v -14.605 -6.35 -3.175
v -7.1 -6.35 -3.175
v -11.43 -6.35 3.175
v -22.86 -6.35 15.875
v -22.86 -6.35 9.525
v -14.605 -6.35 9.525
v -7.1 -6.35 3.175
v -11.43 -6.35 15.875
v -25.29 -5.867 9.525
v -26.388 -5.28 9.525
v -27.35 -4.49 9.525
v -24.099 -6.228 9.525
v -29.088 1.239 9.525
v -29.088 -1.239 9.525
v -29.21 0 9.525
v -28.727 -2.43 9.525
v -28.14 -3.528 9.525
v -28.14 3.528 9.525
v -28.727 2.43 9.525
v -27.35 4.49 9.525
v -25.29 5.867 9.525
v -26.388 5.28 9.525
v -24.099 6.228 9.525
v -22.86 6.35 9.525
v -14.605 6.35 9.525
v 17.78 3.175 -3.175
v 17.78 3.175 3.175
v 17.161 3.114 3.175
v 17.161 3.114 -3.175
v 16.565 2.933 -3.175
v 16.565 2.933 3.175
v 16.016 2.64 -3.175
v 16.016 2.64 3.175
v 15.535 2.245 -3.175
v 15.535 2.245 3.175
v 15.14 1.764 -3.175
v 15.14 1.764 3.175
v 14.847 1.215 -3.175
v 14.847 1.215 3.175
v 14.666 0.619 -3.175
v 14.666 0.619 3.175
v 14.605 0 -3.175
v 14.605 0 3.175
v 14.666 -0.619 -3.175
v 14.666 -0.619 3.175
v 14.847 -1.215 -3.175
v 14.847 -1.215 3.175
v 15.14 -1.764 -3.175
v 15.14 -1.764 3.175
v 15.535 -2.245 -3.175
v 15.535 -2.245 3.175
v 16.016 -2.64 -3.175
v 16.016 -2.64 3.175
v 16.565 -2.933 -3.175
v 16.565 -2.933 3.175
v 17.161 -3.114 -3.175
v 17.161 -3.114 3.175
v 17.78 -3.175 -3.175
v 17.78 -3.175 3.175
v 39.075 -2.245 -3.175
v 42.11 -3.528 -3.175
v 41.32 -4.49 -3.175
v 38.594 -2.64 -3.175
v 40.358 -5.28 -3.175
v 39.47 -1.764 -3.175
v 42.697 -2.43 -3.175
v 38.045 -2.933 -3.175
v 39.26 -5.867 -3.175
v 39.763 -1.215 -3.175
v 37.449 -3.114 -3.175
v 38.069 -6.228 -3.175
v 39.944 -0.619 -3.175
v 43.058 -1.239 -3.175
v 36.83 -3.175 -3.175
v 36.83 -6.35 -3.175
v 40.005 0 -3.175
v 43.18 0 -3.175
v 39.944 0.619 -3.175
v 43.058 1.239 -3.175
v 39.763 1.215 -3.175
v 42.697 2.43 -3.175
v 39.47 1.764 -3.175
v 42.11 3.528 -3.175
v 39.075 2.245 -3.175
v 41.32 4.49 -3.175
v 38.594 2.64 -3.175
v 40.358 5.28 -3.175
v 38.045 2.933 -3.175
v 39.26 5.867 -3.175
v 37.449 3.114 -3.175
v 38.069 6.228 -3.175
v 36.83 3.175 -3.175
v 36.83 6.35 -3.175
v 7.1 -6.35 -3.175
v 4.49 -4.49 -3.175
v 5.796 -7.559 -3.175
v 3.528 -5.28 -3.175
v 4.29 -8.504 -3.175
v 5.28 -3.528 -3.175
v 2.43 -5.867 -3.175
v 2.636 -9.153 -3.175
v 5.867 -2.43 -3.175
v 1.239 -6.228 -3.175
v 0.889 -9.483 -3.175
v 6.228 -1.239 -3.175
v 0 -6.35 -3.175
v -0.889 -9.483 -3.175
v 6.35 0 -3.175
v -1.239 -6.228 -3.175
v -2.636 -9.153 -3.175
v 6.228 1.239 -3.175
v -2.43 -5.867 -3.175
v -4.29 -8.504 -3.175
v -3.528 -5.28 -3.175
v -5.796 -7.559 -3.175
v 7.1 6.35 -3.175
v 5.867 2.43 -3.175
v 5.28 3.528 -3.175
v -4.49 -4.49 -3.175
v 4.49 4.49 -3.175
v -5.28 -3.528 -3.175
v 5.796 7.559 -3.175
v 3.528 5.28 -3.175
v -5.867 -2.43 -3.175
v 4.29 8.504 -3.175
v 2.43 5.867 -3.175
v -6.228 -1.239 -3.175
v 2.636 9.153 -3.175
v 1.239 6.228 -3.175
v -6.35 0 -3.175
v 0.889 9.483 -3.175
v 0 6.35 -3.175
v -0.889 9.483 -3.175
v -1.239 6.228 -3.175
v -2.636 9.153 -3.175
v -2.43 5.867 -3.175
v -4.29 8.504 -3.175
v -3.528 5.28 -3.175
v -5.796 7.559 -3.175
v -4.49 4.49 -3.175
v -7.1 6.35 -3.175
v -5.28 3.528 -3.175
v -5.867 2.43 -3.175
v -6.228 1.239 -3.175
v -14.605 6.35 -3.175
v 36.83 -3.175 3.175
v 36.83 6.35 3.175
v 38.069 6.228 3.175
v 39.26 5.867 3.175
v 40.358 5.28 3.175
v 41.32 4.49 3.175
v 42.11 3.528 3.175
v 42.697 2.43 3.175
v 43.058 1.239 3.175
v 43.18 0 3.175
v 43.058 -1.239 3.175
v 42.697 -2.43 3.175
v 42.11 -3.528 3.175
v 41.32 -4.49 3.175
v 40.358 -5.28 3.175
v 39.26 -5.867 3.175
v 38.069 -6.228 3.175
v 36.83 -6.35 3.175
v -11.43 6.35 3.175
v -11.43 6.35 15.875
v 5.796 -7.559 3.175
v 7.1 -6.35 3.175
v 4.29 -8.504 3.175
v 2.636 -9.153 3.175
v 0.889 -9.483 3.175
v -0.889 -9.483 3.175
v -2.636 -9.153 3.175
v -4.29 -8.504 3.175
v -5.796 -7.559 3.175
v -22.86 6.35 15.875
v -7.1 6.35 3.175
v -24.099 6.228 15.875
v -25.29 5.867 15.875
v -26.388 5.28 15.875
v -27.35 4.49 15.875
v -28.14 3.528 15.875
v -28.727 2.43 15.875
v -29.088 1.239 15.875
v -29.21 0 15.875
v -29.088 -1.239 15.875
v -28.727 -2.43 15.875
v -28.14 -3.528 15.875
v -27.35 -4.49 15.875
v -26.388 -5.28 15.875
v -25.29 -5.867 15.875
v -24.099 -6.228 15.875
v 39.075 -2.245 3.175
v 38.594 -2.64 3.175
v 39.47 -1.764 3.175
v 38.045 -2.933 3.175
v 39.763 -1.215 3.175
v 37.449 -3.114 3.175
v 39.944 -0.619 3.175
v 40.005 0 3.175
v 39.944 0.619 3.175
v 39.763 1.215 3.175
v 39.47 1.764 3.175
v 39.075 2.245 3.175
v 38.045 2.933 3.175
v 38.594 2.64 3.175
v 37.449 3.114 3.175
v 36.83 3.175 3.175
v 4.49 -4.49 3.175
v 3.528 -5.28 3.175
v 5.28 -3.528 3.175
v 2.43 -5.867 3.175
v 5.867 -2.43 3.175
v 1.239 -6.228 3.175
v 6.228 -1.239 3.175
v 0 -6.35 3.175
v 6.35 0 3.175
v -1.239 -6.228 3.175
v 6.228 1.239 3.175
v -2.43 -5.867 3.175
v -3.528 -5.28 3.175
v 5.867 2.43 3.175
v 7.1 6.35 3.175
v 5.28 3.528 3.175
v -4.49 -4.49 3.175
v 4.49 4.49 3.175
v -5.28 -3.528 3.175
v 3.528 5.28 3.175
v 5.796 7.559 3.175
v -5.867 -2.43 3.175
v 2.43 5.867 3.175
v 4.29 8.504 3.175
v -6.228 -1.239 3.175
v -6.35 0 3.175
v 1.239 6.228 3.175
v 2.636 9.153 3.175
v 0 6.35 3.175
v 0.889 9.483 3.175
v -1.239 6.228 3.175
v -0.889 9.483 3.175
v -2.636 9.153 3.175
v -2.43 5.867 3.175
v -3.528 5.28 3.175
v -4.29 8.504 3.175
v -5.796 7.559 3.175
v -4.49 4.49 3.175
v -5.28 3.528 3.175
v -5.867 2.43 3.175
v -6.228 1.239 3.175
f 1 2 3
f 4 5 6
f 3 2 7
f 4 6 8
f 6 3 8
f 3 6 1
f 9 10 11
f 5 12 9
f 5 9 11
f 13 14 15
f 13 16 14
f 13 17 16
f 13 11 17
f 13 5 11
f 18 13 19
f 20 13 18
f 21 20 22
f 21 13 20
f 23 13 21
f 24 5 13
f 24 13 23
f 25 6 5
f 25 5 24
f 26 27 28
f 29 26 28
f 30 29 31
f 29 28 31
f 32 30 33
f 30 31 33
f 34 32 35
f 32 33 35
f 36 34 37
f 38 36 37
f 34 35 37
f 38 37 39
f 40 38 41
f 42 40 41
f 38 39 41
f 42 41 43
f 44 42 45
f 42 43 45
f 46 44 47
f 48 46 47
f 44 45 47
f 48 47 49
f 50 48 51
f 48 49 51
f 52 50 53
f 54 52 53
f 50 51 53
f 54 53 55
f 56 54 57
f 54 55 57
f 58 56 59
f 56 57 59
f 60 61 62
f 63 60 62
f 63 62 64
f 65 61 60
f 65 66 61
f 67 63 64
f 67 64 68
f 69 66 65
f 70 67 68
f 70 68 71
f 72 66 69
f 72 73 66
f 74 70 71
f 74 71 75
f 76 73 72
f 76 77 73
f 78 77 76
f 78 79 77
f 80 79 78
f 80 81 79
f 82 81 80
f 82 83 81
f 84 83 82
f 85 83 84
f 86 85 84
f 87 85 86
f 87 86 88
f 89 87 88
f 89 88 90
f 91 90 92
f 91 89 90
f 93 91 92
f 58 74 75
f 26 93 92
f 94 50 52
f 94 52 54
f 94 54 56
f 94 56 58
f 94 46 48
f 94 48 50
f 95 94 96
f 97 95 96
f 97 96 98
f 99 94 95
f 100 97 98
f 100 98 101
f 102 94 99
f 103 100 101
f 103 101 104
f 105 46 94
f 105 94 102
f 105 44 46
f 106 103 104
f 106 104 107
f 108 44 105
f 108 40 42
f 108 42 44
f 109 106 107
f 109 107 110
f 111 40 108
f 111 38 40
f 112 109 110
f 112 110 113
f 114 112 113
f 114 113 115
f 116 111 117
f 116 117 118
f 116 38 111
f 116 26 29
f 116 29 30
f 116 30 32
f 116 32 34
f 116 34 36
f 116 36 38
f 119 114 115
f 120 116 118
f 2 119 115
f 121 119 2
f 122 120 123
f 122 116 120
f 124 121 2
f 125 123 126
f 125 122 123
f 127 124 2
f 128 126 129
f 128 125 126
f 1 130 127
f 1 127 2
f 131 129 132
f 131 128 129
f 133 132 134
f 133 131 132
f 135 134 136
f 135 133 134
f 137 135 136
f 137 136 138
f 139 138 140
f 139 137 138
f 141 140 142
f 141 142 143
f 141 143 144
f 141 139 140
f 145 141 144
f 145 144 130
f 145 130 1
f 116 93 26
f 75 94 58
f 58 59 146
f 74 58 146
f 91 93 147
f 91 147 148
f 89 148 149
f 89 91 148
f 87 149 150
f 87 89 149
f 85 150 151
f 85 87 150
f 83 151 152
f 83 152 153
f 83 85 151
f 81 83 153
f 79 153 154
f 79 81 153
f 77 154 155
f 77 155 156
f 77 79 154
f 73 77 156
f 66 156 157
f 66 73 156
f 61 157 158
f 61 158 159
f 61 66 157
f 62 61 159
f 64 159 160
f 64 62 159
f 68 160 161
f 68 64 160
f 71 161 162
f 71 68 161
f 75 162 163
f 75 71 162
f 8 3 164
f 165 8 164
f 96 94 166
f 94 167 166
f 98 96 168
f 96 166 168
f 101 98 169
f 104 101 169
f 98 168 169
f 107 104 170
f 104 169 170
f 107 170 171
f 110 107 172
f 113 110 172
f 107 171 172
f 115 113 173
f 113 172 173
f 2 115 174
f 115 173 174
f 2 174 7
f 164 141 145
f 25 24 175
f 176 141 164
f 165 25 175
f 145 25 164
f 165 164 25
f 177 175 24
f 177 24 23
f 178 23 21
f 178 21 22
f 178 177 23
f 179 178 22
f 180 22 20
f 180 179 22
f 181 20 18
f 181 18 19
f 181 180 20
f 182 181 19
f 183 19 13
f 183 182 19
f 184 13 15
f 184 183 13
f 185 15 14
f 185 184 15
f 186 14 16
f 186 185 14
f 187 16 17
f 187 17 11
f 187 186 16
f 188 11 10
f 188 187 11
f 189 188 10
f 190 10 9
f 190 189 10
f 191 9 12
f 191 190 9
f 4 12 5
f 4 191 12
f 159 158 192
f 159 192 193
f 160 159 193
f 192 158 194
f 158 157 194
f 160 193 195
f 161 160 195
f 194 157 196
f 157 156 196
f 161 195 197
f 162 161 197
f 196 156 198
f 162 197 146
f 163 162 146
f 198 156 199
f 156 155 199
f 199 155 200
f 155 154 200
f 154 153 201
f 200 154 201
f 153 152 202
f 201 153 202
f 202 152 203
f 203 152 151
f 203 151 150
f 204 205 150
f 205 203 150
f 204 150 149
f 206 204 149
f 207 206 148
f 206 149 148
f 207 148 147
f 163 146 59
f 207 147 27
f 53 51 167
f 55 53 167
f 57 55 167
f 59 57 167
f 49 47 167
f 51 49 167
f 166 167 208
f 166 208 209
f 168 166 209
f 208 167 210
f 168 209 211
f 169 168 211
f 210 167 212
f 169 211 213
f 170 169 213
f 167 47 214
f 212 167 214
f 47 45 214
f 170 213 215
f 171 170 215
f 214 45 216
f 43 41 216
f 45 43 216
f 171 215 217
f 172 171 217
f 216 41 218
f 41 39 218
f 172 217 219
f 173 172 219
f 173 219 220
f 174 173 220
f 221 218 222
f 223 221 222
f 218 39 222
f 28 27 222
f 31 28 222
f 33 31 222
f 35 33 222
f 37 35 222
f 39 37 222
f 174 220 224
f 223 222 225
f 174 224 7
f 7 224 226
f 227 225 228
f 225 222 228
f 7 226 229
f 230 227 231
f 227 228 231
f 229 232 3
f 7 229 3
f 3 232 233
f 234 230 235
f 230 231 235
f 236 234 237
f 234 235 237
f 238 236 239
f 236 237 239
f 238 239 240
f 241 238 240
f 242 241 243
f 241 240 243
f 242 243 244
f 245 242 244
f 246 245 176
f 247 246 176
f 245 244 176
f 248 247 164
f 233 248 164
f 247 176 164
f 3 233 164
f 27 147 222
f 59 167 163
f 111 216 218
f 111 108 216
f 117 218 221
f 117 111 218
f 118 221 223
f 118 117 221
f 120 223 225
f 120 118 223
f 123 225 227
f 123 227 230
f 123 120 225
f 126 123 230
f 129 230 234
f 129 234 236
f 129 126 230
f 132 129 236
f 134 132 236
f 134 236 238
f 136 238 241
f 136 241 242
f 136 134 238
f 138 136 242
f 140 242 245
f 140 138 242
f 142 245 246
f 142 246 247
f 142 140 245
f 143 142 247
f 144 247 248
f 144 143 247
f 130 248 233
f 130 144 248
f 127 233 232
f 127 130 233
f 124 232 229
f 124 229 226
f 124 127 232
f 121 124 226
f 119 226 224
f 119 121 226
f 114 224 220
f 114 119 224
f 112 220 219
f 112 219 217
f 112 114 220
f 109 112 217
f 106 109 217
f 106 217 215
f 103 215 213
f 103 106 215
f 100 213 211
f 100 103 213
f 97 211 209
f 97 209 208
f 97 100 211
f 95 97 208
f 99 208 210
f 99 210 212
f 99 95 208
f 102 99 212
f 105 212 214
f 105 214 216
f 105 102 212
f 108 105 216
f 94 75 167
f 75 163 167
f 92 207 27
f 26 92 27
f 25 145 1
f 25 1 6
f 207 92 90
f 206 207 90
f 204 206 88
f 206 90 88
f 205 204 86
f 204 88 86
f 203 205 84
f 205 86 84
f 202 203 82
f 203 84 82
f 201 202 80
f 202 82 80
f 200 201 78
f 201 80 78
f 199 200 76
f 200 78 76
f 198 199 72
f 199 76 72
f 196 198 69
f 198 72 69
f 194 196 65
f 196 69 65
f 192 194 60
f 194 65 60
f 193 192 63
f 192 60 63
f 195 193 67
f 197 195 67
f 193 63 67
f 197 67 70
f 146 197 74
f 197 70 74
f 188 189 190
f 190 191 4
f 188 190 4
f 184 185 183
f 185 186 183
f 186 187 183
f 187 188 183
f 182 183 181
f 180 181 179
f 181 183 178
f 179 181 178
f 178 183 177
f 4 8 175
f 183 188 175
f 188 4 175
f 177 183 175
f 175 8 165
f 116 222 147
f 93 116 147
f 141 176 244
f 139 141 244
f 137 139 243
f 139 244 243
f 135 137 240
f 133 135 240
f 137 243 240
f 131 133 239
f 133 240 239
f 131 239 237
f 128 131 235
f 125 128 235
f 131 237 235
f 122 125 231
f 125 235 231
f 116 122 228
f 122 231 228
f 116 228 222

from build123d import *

# Parameters (mm, degrees)
SKETCH1_R           = 6.35
BOSS_EXTRUDE1_DEPTH = 3.175
SKETCH2_R           = 6.35
SKETCH2_R_2         = 3.175
BOSS_EXTRUDE2_DEPTH = 6.35
CUT_EXTRUDE2_DEPTH  = 6.35
SKETCH5_W           = 6.35
SKETCH5_H           = 12.7
BOSS_EXTRUDE3_DEPTH = 12.7
SKETCH6_W           = 6.35
SKETCH6_H           = 12.7
BOSS_EXTRUDE4_DEPTH = 5.08
SKETCH7_R           = 6.35
BOSS_EXTRUDE5_DEPTH = 6.35
SKETCH9_W           = 12.7
SKETCH9_H           = 12.7
CUT_EXTRUDE4_DEPTH  = 3.175


with BuildPart() as part:
    # Sketch1 → Boss-Extrude1 (new body, symmetric)
    with BuildSketch(Plane.XY):
        with BuildLine():
            Line((7.099515829, 6.35), (31.75, 6.35))
            Line((31.75, 6.35), (36.83, 6.35))
            Line((36.83, 6.35), (36.83, -6.35))
            Line((36.83, -6.35), (31.75, -6.35))
            Line((31.75, -6.35), (7.099515829, -6.35))
            ThreePointArc((7.099515829, -6.35), (0, -9.525), (-7.099515829, -6.35))
            Line((-7.099515829, -6.35), (-17.78, -6.35))
            Line((-17.78, -6.35), (-17.78, 6.35))
            Line((-17.78, 6.35), (-7.099515829, 6.35))
            ThreePointArc((-7.099515829, 6.35), (0, 9.525), (7.099515829, 6.35))
        make_face()
        Circle(SKETCH1_R, mode=Mode.SUBTRACT)
    extrude(amount=BOSS_EXTRUDE1_DEPTH, both=True)

    # Sketch2 → Boss-Extrude2 (add)
    with BuildSketch(Plane(origin=(0, 0, -3.175), x_dir=(-1, 0, 0), z_dir=(0, 0, -1))):
        with Locations((-36.83, 0)):
            Circle(SKETCH2_R)
        with Locations((-36.83, 0)):
            Circle(SKETCH2_R_2, mode=Mode.SUBTRACT)
    extrude(amount=-BOSS_EXTRUDE2_DEPTH)

    # Sketch4 → Cut-Extrude2 (cut)
    with BuildSketch(Plane.XY.offset(3.175)):
        with BuildLine():
            Line((36.83, 3.175), (17.78, 3.175))
            ThreePointArc((17.78, 3.175), (14.605, 0), (17.78, -3.175))
            Line((17.78, -3.175), (36.83, -3.175))
            ThreePointArc((36.83, -3.175), (40.005, 0), (36.83, 3.175))
        make_face()
    extrude(amount=-CUT_EXTRUDE2_DEPTH, mode=Mode.SUBTRACT)

    # Sketch5 → Boss-Extrude3 (add)
    with BuildSketch(Plane.XY.offset(3.175)):
        with Locations((-14.605, 0)):
            Rectangle(SKETCH5_W, SKETCH5_H)
    extrude(amount=BOSS_EXTRUDE3_DEPTH)

    # Sketch6 → Boss-Extrude4 (add)
    with BuildSketch(Plane.ZY.offset(17.78)):
        with Locations((12.7, 0)):
            Rectangle(SKETCH6_W, SKETCH6_H)
    extrude(amount=BOSS_EXTRUDE4_DEPTH)

    # Sketch7 → Boss-Extrude5 (add)
    with BuildSketch(Plane.XY.offset(15.875)):
        with Locations((-22.86, 0)):
            Circle(SKETCH7_R)
    extrude(amount=-BOSS_EXTRUDE5_DEPTH)

    # Sketch9 → Cut-Extrude4 (cut)
    with BuildSketch(Plane.ZY.offset(17.78)):
        with Locations((3.175, 0)):
            Rectangle(SKETCH9_W, SKETCH9_H)
    extrude(amount=-CUT_EXTRUDE4_DEPTH, mode=Mode.SUBTRACT)


solid = part.part
